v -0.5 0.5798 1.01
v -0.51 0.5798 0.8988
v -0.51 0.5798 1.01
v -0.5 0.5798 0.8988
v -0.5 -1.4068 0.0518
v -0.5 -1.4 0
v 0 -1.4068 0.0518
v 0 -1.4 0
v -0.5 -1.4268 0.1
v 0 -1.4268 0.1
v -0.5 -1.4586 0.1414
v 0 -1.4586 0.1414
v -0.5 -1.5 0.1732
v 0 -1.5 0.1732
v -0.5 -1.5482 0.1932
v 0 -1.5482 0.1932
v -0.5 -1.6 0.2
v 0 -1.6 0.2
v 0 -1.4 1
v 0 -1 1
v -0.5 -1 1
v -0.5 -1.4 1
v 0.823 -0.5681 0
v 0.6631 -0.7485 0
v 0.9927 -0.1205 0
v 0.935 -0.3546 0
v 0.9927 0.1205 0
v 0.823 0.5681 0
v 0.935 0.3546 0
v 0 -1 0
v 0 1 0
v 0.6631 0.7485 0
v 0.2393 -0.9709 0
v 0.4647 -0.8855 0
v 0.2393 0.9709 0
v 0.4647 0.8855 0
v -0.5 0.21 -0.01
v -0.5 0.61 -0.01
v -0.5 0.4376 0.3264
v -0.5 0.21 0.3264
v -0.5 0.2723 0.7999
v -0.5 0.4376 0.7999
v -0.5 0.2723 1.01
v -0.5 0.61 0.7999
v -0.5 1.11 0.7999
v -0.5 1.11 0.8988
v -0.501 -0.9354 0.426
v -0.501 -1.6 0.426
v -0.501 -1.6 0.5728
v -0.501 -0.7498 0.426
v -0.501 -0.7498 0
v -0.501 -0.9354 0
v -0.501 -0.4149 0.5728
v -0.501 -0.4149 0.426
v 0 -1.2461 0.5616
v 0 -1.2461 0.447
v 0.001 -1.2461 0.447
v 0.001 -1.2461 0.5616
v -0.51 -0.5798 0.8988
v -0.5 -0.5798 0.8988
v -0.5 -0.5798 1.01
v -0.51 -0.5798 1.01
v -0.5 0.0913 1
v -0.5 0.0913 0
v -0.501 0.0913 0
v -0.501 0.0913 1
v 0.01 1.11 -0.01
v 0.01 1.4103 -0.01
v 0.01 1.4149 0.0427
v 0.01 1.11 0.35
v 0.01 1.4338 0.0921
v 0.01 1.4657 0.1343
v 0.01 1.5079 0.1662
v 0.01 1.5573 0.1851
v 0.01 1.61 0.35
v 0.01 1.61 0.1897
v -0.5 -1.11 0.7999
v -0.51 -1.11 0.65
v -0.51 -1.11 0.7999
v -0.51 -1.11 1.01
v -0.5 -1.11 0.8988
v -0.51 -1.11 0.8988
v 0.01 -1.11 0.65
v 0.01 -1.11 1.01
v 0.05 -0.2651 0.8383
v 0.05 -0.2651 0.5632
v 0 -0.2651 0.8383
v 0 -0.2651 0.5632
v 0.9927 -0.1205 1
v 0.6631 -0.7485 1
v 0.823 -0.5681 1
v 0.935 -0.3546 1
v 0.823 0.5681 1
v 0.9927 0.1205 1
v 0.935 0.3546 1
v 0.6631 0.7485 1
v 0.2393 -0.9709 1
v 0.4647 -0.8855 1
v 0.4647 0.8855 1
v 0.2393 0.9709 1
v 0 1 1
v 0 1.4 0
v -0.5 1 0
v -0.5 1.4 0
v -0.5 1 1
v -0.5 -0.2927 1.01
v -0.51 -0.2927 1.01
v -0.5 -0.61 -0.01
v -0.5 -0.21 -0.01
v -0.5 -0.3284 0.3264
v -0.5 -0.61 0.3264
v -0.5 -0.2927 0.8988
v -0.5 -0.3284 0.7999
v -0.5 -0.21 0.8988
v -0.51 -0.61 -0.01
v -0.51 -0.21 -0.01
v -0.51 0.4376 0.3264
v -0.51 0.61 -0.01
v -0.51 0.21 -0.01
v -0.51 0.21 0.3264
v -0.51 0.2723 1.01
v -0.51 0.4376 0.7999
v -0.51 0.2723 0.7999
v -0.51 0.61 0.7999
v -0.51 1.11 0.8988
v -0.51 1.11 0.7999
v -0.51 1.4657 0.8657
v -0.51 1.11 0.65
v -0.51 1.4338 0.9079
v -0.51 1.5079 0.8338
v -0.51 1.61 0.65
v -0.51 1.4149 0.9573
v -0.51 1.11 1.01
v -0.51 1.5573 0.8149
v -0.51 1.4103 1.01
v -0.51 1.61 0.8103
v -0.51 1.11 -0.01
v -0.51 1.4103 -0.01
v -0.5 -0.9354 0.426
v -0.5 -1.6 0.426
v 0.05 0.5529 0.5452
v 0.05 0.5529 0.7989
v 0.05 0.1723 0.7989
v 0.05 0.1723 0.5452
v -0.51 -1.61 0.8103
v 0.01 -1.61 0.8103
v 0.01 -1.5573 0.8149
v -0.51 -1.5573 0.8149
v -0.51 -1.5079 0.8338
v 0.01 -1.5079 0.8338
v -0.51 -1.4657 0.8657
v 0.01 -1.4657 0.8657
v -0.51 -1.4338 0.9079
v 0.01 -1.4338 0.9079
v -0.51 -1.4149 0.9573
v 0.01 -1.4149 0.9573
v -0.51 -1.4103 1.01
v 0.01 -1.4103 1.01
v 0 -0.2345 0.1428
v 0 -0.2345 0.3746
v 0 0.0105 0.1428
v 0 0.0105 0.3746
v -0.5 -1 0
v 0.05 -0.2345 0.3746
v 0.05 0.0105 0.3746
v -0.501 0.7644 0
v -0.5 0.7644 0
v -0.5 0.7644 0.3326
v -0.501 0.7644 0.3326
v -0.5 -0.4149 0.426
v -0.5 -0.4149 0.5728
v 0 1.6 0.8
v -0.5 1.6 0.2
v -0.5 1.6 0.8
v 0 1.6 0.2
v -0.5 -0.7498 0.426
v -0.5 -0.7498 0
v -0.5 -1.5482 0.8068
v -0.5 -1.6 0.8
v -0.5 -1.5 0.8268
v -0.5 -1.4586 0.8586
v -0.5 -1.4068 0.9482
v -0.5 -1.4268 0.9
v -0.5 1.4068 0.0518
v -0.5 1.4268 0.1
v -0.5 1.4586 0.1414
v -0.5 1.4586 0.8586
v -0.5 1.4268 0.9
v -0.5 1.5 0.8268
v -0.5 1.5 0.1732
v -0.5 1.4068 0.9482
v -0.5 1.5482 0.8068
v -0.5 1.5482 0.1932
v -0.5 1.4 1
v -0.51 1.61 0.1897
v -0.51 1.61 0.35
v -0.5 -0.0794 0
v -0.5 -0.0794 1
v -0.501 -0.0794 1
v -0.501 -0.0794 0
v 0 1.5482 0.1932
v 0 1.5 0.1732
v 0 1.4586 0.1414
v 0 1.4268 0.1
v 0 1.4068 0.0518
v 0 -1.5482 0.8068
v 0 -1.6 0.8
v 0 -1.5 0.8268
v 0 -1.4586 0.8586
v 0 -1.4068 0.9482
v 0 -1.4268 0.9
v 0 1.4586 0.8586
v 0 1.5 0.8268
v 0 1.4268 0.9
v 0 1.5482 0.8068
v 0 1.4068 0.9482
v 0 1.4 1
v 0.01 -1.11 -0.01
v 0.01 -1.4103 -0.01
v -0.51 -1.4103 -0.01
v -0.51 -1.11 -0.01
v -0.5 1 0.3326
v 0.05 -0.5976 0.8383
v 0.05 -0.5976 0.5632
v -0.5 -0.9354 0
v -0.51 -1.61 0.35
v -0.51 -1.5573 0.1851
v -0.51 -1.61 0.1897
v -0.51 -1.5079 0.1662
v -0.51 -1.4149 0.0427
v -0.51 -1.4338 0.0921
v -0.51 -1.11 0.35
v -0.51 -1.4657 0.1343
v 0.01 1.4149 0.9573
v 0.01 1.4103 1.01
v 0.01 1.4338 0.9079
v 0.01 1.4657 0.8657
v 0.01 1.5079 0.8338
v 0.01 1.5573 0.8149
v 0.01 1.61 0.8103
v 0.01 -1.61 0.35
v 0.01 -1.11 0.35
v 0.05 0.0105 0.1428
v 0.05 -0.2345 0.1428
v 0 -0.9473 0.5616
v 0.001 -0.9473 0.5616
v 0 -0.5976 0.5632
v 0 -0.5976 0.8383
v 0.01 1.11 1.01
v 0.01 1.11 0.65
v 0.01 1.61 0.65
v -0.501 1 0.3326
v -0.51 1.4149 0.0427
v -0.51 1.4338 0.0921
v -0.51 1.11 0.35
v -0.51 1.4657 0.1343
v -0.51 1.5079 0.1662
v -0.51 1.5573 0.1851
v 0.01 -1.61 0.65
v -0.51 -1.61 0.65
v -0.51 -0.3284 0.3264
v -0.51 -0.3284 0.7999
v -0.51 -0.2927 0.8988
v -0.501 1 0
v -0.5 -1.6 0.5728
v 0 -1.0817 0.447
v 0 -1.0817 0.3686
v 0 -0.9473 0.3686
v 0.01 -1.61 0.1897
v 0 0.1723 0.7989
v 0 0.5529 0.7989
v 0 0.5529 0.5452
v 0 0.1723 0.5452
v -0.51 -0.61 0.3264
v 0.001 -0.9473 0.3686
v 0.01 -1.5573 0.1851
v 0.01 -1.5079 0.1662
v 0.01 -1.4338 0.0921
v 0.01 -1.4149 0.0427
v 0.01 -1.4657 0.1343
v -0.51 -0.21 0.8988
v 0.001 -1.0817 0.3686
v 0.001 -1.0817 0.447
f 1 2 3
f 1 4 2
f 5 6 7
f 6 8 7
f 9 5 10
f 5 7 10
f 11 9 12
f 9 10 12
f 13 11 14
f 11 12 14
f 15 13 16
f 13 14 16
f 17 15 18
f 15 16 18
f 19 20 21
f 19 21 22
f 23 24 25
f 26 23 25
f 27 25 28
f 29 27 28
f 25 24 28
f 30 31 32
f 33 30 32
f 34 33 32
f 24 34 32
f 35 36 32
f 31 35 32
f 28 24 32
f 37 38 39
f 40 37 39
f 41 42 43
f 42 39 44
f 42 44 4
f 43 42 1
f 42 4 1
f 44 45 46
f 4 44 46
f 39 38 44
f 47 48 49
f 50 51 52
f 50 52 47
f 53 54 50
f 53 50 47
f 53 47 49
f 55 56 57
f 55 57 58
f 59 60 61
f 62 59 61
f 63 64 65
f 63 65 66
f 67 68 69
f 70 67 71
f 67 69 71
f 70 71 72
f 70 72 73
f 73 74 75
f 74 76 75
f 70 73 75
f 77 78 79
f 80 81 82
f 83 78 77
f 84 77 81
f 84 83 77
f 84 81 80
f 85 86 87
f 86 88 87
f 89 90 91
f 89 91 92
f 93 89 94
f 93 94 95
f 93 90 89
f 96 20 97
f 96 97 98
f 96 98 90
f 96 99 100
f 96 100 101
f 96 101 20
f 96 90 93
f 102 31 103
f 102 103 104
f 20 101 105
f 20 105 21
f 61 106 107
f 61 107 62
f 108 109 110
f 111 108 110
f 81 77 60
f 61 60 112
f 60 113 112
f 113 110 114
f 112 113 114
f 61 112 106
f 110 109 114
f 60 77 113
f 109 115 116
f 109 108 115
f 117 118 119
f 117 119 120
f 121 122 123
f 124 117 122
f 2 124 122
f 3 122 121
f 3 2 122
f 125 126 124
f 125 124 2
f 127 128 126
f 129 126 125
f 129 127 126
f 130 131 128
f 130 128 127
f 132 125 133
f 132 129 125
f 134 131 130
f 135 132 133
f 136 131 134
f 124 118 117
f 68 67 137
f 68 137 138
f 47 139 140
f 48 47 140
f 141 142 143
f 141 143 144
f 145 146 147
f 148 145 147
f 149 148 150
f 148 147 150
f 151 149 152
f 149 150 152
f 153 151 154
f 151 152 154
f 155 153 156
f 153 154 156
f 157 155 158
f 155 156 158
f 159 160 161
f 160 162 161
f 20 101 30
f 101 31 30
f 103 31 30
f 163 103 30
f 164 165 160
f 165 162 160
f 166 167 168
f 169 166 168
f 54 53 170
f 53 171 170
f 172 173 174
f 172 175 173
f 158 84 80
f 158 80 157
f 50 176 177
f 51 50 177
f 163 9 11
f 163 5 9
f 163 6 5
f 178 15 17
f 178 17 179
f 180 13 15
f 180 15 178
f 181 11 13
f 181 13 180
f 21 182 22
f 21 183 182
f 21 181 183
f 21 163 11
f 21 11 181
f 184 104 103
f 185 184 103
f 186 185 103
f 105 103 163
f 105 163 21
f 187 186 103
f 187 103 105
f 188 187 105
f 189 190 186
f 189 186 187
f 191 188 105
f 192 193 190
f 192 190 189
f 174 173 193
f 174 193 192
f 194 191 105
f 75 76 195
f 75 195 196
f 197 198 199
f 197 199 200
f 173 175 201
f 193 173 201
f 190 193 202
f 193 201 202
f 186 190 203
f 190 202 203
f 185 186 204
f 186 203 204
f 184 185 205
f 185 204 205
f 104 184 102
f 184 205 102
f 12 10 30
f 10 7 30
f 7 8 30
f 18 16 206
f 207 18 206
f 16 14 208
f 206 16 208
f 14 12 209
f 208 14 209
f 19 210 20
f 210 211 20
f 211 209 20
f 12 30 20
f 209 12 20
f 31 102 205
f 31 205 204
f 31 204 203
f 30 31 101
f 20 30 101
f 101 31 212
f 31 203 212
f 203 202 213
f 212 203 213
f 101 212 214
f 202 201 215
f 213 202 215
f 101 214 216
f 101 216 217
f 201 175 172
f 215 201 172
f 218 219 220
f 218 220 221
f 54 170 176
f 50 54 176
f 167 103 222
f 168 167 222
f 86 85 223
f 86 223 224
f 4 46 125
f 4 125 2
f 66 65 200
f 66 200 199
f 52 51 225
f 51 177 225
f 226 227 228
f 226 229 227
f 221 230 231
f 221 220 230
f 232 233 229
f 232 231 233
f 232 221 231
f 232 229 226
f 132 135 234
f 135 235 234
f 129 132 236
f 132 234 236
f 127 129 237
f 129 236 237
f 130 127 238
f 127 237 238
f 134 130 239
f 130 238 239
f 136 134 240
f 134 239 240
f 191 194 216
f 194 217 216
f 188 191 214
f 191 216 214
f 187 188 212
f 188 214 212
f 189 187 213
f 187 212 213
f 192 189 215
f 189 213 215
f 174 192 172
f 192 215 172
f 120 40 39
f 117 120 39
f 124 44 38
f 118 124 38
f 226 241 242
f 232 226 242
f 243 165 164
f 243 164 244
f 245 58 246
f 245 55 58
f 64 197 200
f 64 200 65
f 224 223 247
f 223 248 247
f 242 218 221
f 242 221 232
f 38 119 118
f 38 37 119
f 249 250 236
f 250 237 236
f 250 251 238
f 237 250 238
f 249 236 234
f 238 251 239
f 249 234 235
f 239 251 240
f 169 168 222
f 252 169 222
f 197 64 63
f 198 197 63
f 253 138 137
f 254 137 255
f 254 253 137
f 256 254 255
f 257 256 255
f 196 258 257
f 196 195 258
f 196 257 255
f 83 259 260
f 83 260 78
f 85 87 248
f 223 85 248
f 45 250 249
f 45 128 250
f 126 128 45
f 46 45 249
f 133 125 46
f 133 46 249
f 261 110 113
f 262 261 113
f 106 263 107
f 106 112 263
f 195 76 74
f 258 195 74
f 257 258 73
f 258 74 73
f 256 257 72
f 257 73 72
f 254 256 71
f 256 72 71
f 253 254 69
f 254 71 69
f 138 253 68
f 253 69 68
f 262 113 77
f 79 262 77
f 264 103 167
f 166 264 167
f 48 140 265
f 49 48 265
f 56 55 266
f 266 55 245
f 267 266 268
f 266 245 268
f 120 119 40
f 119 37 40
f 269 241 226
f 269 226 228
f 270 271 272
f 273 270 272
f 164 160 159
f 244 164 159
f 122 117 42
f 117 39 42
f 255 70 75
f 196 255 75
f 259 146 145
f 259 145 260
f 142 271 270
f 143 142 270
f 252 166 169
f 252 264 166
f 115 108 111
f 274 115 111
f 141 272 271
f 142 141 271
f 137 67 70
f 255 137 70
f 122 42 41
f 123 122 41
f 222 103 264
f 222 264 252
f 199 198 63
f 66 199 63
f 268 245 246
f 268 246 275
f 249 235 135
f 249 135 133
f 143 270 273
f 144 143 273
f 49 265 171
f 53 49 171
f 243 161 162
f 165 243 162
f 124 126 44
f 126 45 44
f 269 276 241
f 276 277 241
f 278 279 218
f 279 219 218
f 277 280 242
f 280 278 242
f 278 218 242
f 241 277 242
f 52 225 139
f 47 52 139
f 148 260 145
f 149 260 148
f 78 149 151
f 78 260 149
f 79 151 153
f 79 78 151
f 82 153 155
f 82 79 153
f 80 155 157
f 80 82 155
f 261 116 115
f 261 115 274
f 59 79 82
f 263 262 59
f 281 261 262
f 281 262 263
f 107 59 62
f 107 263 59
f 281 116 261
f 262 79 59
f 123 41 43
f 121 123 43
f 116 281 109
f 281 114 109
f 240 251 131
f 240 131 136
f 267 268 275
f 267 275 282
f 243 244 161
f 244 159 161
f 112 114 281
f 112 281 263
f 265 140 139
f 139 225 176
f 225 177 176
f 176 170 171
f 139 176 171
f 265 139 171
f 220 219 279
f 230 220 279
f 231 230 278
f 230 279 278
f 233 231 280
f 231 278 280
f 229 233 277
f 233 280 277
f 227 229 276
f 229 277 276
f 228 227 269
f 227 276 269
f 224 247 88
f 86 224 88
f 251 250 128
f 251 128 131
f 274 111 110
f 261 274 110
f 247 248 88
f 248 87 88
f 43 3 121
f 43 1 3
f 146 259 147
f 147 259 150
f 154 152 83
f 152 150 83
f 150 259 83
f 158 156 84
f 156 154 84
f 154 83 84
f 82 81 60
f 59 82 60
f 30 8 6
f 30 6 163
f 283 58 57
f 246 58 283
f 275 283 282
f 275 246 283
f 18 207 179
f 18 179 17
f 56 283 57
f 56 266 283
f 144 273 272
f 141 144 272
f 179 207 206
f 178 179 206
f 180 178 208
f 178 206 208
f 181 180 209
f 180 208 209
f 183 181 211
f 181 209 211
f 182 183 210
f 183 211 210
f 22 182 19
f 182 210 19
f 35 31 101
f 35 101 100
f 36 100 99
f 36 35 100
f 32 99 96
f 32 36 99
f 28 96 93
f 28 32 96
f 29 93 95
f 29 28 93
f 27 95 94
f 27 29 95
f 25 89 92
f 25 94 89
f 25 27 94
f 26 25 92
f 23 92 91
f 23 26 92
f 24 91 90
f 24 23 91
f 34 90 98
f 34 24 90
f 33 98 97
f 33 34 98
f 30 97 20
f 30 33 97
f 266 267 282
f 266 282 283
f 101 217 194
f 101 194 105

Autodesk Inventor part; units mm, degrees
ref_plane "YZ Plane" through (0, 0, 0) normal (1, 0, 0) x (0, 1, 0)
ref_plane "XZ Plane" through (0, 0, 0) normal (0, 1, 0) x (-1, 0, 0)
ref_plane "XY Plane" through (0, 0, 0) normal (0, 0, 1) x (1, 0, 0)
sketch "Sketch1" plane through (0, 0, 0) normal (0, 0, 1) x (1, 0, 0)
  arc A0 (0, -1) -> (0, 1) centre (0, 0) ccw
  line L0 (0, 0) -> (0, 1) construction
  line L1 (0, 0) -> (1, 0) construction
  line L2 (0, 0) -> (0, -1) construction
  line L3 (0, 1) -> (0, -1)
  dimension "d0" = 1
  dimension "d1" = 90
  dimension "d2" = 180
extrude "Extrusion1" add sketch "Sketch1" along normal blind 1
sketch "Sketch2" plane through (0, -1, 0) normal (-1, 0, 0) x (0, 0, 1)
  line L0 (0, 2.6) -> (1, 2.6)
  line L1 (1, 2.6) -> (1, -0.6)
  line L2 (1, -0.6) -> (0, -0.6)
  line L3 (0, -0.6) -> (0, 2.6)
  line L4 (0, 2) -> (0, 0) projected
  line L5 (1, 2) -> (1, 0) projected
  arc A0 (0, 2.4) -> (0.2, 2.6) centre (0, 2.6) ccw
  arc A1 (0.8, 2.6) -> (1, 2.4) centre (1, 2.6) ccw
  arc A2 (1, -0.4) -> (0.8, -0.6) centre (1, -0.6) ccw
  arc A3 (0.2, -0.6) -> (0, -0.4) centre (0, -0.6) ccw
  point P0 (0, 1)
  point P1 (1, 1)
  point P2 (1, 1)
  dimension "d5" = 3.2
  dimension "d6" = 0.2
extrude "Extrusion2" add sketch "Sketch2" along normal blind 0.5 separate body contours L0 A1 L1 A2 L2 A3 L3 A0
sketch "Sketch3" plane through (-0.5, -1, 0) normal (-1, 0, 0) x (0, 0, 1)
  line L0 (0, 2.4) -> (0, -0.4) construction
  arc A0 (0.2, -0.6) -> (0, -0.4) centre (0, -0.6) ccw projected
  line L1 (0.2, -0.6) -> (0.8, -0.6) projected
  arc A1 (1, -0.4) -> (0.8, -0.6) centre (1, -0.6) ccw projected
  line L2 (1, -0.4) -> (1, 2.4) construction
  arc A2 (0.8, 2.6) -> (1, 2.4) centre (1, 2.6) ccw projected
  line L3 (0.8, 2.6) -> (0.2, 2.6) projected
  arc A3 (0, 2.4) -> (0.2, 2.6) centre (0, 2.6) ccw projected
  line L4 (1.01, 2.4103) -> (1.01, -0.4103)
  arc A4 (1.01, -0.4103) -> (0.8103, -0.61) centre (1, -0.6) ccw
  line L5 (0.8103, -0.61) -> (0.1897, -0.61)
  arc A5 (0.1897, -0.61) -> (-0.01, -0.4103) centre (0, -0.6) ccw
  line L6 (-0.01, -0.4103) -> (-0.01, 2.4103)
  arc A6 (-0.01, 2.4103) -> (0.1897, 2.61) centre (0, 2.6) ccw
  line L7 (0.1897, 2.61) -> (0.8103, 2.61)
  arc A7 (0.8103, 2.61) -> (1.01, 2.4103) centre (1, 2.6) ccw
  line L8 (-0.01, 2.11) -> (1.01, 2.11)
  line L9 (-0.01, -0.11) -> (1.01, -0.11)
  line L10 (0.35, -0.61) -> (0.35, -0.11)
  line L11 (0.65, -0.61) -> (0.65, -0.11)
  line L12 (0.35, 2.11) -> (0.35, 2.61)
  line L13 (0.65, 2.11) -> (0.65, 2.61)
  line L14 (-0.01, 0.39) -> (1.01, 0.39)
  line L15 (1.01, 0.39) -> (1.01, 0.79)
  line L16 (1.01, 0.79) -> (-0.01, 0.79)
  line L17 (-0.01, 0.79) -> (-0.01, 0.39)
  line L18 (-0.01, 1.21) -> (1.01, 1.21)
  line L19 (1.01, 1.21) -> (1.01, 1.61)
  line L20 (1.01, 1.61) -> (-0.01, 1.61)
  line L21 (-0.01, 1.61) -> (-0.01, 1.21)
  line L22 (0.3264, 0.39) -> (0.3264, 0.6716)
  line L23 (0.3264, 0.6716) -> (1, 0.6716)
  line L24 (1, 0) -> (1, 2) projected
  line L25 (0.7999, 0.39) -> (0.7999, -0.11)
  line L26 (0.8988, -0.11) -> (0.8988, 0.39)
  line L27 (0.8988, 0.6716) -> (0.8988, 0.6093)
  line L28 (0.8988, 0.6093) -> (1.01, 0.6093)
  line L29 (0.8988, 1.21) -> (0.8988, 1.2723)
  line L30 (0.8988, 1.2723) -> (1.01, 1.2723)
  line L31 (0.8988, 0.39) -> (0.8988, 0.4202)
  line L32 (0.8988, 0.4202) -> (1.01, 0.4202)
  line L33 (0.8988, 1.61) -> (0.8988, 1.5798)
  line L34 (0.8988, 1.5798) -> (1.01, 1.5798)
  line L35 (0.8988, 1.61) -> (0.8988, 1.6766)
  line L36 (0.8988, 1.6766) -> (0.8988, 2.11)
  line L37 (0.7999, 2.11) -> (0.7999, 1.61)
  line L38 (0.3264, 1.21) -> (0.3264, 1.4376)
  line L39 (0.3264, 1.4376) -> (0.7999, 1.4376)
  line L40 (0.7999, 1.4376) -> (0.7999, 1.21)
  line L41 (0.7999, 1.2723) -> (0.8988, 1.2723)
  line L42 (0.7999, 0.39) -> (0.7999, 0.6716)
  line L43 (0.8988, 0.79) -> (0.8988, 0.7073)
  line L44 (0.8988, 0.7073) -> (1.01, 0.7073)
  dimension "d9" = 0.01
  dimension "d10" = 0.5
  dimension "d11" = 0.5
  dimension "d23" = 0.35
  dimension "d24" = 0.35
  dimension "d25" = 0.4
  dimension "d26" = 0.4
  dimension "d27" = 0.5
  dimension "d28" = 0.5
extrude "Extrusion4" add sketch "Sketch3" along normal blind 0.01 separate body contours L10 L5 A5 L6 L9 | L11 L9 L4 A4 L5 | L25 L14 L26 L9 | L6 L16 L43 L44 L24 L23 L22 L14 | L42 L23 L27 L28 L24 L32 L31 L14 | L6 L20 L33 L34 L24 L30 L41 L40 L39 L38 L18 | L23 L24 L28 L27 | L32 L24 L28 L4 | L24 L44 L4 L28 | L6 A6 L7 L12 L8 | L37 L8 L36 L35 L20 | L8 L13 L7 A7 L4 | L24 L34 L4 L30
extrude "Extrusion8" add sketch "Sketch3" against normal blind 0.51 contours L10 L5 A5 L6 L9 | L11 L9 L4 A4 L5 | L6 A6 L7 L12 L8 | L8 L13 L7 A7 L4 bodies 3
sketch "Sketch4" plane through (-0.5, -1, 0) normal (-1, 0, 0) x (0, 0, 1)
  line L0 (1, -0.4) -> (1, 2.4) projected
  line L1 (1, 0) -> (1, 2) projected
  line L2 (1, 0.9206) -> (0, 0.9206)
  line L3 (0, 0.9206) -> (0, 1.0913)
  line L4 (0, 1.0913) -> (1, 1.0913)
  line L5 (1, 1.0913) -> (1, 0.9206)
  line L6 (0, 2.4) -> (0, -0.4) projected
  line L7 (0, 0) -> (0, 2) projected
  line L8 (0, 2) -> (1, 2) projected
  line L9 (0, 1.7644) -> (0.3326, 1.7644)
  line L10 (0.3326, 1.7644) -> (0.3326, 2)
  line L11 (0.3326, 2) -> (0, 2)
  line L12 (0, 2) -> (0, 1.7644)
  line L13 (0, 2.4) -> (0, -0.4) projected
  line L14 (0, 0.0646) -> (0.5437, 0.0646)
  line L15 (0.5437, 0.0646) -> (0.5437, 0.2502)
  line L16 (0.5437, 0.2502) -> (0, 0.2502)
  line L17 (0, 0.2502) -> (0, 0.0646)
  line L18 (0.426, -0.6) -> (0.5728, -0.6)
  line L19 (0.5728, -0.6) -> (0.5728, 0.5851)
  line L20 (0.5728, 0.5851) -> (0.426, 0.5851)
  line L21 (0.426, 0.5851) -> (0.426, -0.6)
  line L22 (0.2, -0.6) -> (0.8, -0.6) projected
  point P0 (0, 1)
  point P1 (1, 1.9835)
extrude "Extrusion5" add sketch "Sketch4" along normal blind 0.001 separate body contours L2 L3 L4 L0 | L16 L21 L14 L6 | L10 L9 L6 L8 | L21 L20 L19 L18 L14 L15 L16 | L16 L15 L14 L21
sketch "Sketch5" plane through (0, -1, 0) normal (1, 0, 0) x (0, 0, -1)
  line L0 (-0.447, -0.2461) -> (-0.5616, -0.2461)
  line L1 (-0.5616, -0.2461) -> (-0.5616, 0.0527)
  line L2 (-0.5616, 0.0527) -> (-0.3686, 0.0527)
  line L3 (-0.3686, 0.0527) -> (-0.3686, -0.0817)
  line L4 (-0.3686, -0.0817) -> (-0.447, -0.0817)
  line L5 (-0.447, -0.0817) -> (-0.447, -0.2461)
extrude "Extrusion6" add sketch "Sketch5" along normal blind 0.001 bodies 4
sketch "Sketch6" plane through (0, -1, 0) normal (1, 0, 0) x (0, 0, -1)
  line L0 (-0.8383, 0.4024) -> (-0.5632, 0.4024)
  line L1 (-0.5632, 0.4024) -> (-0.5632, 0.7349)
  line L2 (-0.5632, 0.7349) -> (-0.8383, 0.7349)
  line L3 (-0.8383, 0.7349) -> (-0.8383, 0.4024)
  line L4 (-0.7989, 1.1723) -> (-0.5452, 1.1723)
  line L5 (-0.5452, 1.1723) -> (-0.5452, 1.5529)
  line L6 (-0.5452, 1.5529) -> (-0.7989, 1.5529)
  line L7 (-0.7989, 1.5529) -> (-0.7989, 1.1723)
  line L8 (-0.3746, 0.7655) -> (-0.1428, 0.7655)
  line L9 (-0.1428, 0.7655) -> (-0.1428, 1.0105)
  line L10 (-0.1428, 1.0105) -> (-0.3746, 1.0105)
  line L11 (-0.3746, 1.0105) -> (-0.3746, 0.7655)
  point P0 (0, 1)
extrude "Extrusion7" add sketch "Sketch6" along normal blind 0.05 separate body
equation "\"d11\" = d10"
equation "\"d24\" = d23"
equation "\"d26\" = d25"
properties part number "LED 3216 RA"
